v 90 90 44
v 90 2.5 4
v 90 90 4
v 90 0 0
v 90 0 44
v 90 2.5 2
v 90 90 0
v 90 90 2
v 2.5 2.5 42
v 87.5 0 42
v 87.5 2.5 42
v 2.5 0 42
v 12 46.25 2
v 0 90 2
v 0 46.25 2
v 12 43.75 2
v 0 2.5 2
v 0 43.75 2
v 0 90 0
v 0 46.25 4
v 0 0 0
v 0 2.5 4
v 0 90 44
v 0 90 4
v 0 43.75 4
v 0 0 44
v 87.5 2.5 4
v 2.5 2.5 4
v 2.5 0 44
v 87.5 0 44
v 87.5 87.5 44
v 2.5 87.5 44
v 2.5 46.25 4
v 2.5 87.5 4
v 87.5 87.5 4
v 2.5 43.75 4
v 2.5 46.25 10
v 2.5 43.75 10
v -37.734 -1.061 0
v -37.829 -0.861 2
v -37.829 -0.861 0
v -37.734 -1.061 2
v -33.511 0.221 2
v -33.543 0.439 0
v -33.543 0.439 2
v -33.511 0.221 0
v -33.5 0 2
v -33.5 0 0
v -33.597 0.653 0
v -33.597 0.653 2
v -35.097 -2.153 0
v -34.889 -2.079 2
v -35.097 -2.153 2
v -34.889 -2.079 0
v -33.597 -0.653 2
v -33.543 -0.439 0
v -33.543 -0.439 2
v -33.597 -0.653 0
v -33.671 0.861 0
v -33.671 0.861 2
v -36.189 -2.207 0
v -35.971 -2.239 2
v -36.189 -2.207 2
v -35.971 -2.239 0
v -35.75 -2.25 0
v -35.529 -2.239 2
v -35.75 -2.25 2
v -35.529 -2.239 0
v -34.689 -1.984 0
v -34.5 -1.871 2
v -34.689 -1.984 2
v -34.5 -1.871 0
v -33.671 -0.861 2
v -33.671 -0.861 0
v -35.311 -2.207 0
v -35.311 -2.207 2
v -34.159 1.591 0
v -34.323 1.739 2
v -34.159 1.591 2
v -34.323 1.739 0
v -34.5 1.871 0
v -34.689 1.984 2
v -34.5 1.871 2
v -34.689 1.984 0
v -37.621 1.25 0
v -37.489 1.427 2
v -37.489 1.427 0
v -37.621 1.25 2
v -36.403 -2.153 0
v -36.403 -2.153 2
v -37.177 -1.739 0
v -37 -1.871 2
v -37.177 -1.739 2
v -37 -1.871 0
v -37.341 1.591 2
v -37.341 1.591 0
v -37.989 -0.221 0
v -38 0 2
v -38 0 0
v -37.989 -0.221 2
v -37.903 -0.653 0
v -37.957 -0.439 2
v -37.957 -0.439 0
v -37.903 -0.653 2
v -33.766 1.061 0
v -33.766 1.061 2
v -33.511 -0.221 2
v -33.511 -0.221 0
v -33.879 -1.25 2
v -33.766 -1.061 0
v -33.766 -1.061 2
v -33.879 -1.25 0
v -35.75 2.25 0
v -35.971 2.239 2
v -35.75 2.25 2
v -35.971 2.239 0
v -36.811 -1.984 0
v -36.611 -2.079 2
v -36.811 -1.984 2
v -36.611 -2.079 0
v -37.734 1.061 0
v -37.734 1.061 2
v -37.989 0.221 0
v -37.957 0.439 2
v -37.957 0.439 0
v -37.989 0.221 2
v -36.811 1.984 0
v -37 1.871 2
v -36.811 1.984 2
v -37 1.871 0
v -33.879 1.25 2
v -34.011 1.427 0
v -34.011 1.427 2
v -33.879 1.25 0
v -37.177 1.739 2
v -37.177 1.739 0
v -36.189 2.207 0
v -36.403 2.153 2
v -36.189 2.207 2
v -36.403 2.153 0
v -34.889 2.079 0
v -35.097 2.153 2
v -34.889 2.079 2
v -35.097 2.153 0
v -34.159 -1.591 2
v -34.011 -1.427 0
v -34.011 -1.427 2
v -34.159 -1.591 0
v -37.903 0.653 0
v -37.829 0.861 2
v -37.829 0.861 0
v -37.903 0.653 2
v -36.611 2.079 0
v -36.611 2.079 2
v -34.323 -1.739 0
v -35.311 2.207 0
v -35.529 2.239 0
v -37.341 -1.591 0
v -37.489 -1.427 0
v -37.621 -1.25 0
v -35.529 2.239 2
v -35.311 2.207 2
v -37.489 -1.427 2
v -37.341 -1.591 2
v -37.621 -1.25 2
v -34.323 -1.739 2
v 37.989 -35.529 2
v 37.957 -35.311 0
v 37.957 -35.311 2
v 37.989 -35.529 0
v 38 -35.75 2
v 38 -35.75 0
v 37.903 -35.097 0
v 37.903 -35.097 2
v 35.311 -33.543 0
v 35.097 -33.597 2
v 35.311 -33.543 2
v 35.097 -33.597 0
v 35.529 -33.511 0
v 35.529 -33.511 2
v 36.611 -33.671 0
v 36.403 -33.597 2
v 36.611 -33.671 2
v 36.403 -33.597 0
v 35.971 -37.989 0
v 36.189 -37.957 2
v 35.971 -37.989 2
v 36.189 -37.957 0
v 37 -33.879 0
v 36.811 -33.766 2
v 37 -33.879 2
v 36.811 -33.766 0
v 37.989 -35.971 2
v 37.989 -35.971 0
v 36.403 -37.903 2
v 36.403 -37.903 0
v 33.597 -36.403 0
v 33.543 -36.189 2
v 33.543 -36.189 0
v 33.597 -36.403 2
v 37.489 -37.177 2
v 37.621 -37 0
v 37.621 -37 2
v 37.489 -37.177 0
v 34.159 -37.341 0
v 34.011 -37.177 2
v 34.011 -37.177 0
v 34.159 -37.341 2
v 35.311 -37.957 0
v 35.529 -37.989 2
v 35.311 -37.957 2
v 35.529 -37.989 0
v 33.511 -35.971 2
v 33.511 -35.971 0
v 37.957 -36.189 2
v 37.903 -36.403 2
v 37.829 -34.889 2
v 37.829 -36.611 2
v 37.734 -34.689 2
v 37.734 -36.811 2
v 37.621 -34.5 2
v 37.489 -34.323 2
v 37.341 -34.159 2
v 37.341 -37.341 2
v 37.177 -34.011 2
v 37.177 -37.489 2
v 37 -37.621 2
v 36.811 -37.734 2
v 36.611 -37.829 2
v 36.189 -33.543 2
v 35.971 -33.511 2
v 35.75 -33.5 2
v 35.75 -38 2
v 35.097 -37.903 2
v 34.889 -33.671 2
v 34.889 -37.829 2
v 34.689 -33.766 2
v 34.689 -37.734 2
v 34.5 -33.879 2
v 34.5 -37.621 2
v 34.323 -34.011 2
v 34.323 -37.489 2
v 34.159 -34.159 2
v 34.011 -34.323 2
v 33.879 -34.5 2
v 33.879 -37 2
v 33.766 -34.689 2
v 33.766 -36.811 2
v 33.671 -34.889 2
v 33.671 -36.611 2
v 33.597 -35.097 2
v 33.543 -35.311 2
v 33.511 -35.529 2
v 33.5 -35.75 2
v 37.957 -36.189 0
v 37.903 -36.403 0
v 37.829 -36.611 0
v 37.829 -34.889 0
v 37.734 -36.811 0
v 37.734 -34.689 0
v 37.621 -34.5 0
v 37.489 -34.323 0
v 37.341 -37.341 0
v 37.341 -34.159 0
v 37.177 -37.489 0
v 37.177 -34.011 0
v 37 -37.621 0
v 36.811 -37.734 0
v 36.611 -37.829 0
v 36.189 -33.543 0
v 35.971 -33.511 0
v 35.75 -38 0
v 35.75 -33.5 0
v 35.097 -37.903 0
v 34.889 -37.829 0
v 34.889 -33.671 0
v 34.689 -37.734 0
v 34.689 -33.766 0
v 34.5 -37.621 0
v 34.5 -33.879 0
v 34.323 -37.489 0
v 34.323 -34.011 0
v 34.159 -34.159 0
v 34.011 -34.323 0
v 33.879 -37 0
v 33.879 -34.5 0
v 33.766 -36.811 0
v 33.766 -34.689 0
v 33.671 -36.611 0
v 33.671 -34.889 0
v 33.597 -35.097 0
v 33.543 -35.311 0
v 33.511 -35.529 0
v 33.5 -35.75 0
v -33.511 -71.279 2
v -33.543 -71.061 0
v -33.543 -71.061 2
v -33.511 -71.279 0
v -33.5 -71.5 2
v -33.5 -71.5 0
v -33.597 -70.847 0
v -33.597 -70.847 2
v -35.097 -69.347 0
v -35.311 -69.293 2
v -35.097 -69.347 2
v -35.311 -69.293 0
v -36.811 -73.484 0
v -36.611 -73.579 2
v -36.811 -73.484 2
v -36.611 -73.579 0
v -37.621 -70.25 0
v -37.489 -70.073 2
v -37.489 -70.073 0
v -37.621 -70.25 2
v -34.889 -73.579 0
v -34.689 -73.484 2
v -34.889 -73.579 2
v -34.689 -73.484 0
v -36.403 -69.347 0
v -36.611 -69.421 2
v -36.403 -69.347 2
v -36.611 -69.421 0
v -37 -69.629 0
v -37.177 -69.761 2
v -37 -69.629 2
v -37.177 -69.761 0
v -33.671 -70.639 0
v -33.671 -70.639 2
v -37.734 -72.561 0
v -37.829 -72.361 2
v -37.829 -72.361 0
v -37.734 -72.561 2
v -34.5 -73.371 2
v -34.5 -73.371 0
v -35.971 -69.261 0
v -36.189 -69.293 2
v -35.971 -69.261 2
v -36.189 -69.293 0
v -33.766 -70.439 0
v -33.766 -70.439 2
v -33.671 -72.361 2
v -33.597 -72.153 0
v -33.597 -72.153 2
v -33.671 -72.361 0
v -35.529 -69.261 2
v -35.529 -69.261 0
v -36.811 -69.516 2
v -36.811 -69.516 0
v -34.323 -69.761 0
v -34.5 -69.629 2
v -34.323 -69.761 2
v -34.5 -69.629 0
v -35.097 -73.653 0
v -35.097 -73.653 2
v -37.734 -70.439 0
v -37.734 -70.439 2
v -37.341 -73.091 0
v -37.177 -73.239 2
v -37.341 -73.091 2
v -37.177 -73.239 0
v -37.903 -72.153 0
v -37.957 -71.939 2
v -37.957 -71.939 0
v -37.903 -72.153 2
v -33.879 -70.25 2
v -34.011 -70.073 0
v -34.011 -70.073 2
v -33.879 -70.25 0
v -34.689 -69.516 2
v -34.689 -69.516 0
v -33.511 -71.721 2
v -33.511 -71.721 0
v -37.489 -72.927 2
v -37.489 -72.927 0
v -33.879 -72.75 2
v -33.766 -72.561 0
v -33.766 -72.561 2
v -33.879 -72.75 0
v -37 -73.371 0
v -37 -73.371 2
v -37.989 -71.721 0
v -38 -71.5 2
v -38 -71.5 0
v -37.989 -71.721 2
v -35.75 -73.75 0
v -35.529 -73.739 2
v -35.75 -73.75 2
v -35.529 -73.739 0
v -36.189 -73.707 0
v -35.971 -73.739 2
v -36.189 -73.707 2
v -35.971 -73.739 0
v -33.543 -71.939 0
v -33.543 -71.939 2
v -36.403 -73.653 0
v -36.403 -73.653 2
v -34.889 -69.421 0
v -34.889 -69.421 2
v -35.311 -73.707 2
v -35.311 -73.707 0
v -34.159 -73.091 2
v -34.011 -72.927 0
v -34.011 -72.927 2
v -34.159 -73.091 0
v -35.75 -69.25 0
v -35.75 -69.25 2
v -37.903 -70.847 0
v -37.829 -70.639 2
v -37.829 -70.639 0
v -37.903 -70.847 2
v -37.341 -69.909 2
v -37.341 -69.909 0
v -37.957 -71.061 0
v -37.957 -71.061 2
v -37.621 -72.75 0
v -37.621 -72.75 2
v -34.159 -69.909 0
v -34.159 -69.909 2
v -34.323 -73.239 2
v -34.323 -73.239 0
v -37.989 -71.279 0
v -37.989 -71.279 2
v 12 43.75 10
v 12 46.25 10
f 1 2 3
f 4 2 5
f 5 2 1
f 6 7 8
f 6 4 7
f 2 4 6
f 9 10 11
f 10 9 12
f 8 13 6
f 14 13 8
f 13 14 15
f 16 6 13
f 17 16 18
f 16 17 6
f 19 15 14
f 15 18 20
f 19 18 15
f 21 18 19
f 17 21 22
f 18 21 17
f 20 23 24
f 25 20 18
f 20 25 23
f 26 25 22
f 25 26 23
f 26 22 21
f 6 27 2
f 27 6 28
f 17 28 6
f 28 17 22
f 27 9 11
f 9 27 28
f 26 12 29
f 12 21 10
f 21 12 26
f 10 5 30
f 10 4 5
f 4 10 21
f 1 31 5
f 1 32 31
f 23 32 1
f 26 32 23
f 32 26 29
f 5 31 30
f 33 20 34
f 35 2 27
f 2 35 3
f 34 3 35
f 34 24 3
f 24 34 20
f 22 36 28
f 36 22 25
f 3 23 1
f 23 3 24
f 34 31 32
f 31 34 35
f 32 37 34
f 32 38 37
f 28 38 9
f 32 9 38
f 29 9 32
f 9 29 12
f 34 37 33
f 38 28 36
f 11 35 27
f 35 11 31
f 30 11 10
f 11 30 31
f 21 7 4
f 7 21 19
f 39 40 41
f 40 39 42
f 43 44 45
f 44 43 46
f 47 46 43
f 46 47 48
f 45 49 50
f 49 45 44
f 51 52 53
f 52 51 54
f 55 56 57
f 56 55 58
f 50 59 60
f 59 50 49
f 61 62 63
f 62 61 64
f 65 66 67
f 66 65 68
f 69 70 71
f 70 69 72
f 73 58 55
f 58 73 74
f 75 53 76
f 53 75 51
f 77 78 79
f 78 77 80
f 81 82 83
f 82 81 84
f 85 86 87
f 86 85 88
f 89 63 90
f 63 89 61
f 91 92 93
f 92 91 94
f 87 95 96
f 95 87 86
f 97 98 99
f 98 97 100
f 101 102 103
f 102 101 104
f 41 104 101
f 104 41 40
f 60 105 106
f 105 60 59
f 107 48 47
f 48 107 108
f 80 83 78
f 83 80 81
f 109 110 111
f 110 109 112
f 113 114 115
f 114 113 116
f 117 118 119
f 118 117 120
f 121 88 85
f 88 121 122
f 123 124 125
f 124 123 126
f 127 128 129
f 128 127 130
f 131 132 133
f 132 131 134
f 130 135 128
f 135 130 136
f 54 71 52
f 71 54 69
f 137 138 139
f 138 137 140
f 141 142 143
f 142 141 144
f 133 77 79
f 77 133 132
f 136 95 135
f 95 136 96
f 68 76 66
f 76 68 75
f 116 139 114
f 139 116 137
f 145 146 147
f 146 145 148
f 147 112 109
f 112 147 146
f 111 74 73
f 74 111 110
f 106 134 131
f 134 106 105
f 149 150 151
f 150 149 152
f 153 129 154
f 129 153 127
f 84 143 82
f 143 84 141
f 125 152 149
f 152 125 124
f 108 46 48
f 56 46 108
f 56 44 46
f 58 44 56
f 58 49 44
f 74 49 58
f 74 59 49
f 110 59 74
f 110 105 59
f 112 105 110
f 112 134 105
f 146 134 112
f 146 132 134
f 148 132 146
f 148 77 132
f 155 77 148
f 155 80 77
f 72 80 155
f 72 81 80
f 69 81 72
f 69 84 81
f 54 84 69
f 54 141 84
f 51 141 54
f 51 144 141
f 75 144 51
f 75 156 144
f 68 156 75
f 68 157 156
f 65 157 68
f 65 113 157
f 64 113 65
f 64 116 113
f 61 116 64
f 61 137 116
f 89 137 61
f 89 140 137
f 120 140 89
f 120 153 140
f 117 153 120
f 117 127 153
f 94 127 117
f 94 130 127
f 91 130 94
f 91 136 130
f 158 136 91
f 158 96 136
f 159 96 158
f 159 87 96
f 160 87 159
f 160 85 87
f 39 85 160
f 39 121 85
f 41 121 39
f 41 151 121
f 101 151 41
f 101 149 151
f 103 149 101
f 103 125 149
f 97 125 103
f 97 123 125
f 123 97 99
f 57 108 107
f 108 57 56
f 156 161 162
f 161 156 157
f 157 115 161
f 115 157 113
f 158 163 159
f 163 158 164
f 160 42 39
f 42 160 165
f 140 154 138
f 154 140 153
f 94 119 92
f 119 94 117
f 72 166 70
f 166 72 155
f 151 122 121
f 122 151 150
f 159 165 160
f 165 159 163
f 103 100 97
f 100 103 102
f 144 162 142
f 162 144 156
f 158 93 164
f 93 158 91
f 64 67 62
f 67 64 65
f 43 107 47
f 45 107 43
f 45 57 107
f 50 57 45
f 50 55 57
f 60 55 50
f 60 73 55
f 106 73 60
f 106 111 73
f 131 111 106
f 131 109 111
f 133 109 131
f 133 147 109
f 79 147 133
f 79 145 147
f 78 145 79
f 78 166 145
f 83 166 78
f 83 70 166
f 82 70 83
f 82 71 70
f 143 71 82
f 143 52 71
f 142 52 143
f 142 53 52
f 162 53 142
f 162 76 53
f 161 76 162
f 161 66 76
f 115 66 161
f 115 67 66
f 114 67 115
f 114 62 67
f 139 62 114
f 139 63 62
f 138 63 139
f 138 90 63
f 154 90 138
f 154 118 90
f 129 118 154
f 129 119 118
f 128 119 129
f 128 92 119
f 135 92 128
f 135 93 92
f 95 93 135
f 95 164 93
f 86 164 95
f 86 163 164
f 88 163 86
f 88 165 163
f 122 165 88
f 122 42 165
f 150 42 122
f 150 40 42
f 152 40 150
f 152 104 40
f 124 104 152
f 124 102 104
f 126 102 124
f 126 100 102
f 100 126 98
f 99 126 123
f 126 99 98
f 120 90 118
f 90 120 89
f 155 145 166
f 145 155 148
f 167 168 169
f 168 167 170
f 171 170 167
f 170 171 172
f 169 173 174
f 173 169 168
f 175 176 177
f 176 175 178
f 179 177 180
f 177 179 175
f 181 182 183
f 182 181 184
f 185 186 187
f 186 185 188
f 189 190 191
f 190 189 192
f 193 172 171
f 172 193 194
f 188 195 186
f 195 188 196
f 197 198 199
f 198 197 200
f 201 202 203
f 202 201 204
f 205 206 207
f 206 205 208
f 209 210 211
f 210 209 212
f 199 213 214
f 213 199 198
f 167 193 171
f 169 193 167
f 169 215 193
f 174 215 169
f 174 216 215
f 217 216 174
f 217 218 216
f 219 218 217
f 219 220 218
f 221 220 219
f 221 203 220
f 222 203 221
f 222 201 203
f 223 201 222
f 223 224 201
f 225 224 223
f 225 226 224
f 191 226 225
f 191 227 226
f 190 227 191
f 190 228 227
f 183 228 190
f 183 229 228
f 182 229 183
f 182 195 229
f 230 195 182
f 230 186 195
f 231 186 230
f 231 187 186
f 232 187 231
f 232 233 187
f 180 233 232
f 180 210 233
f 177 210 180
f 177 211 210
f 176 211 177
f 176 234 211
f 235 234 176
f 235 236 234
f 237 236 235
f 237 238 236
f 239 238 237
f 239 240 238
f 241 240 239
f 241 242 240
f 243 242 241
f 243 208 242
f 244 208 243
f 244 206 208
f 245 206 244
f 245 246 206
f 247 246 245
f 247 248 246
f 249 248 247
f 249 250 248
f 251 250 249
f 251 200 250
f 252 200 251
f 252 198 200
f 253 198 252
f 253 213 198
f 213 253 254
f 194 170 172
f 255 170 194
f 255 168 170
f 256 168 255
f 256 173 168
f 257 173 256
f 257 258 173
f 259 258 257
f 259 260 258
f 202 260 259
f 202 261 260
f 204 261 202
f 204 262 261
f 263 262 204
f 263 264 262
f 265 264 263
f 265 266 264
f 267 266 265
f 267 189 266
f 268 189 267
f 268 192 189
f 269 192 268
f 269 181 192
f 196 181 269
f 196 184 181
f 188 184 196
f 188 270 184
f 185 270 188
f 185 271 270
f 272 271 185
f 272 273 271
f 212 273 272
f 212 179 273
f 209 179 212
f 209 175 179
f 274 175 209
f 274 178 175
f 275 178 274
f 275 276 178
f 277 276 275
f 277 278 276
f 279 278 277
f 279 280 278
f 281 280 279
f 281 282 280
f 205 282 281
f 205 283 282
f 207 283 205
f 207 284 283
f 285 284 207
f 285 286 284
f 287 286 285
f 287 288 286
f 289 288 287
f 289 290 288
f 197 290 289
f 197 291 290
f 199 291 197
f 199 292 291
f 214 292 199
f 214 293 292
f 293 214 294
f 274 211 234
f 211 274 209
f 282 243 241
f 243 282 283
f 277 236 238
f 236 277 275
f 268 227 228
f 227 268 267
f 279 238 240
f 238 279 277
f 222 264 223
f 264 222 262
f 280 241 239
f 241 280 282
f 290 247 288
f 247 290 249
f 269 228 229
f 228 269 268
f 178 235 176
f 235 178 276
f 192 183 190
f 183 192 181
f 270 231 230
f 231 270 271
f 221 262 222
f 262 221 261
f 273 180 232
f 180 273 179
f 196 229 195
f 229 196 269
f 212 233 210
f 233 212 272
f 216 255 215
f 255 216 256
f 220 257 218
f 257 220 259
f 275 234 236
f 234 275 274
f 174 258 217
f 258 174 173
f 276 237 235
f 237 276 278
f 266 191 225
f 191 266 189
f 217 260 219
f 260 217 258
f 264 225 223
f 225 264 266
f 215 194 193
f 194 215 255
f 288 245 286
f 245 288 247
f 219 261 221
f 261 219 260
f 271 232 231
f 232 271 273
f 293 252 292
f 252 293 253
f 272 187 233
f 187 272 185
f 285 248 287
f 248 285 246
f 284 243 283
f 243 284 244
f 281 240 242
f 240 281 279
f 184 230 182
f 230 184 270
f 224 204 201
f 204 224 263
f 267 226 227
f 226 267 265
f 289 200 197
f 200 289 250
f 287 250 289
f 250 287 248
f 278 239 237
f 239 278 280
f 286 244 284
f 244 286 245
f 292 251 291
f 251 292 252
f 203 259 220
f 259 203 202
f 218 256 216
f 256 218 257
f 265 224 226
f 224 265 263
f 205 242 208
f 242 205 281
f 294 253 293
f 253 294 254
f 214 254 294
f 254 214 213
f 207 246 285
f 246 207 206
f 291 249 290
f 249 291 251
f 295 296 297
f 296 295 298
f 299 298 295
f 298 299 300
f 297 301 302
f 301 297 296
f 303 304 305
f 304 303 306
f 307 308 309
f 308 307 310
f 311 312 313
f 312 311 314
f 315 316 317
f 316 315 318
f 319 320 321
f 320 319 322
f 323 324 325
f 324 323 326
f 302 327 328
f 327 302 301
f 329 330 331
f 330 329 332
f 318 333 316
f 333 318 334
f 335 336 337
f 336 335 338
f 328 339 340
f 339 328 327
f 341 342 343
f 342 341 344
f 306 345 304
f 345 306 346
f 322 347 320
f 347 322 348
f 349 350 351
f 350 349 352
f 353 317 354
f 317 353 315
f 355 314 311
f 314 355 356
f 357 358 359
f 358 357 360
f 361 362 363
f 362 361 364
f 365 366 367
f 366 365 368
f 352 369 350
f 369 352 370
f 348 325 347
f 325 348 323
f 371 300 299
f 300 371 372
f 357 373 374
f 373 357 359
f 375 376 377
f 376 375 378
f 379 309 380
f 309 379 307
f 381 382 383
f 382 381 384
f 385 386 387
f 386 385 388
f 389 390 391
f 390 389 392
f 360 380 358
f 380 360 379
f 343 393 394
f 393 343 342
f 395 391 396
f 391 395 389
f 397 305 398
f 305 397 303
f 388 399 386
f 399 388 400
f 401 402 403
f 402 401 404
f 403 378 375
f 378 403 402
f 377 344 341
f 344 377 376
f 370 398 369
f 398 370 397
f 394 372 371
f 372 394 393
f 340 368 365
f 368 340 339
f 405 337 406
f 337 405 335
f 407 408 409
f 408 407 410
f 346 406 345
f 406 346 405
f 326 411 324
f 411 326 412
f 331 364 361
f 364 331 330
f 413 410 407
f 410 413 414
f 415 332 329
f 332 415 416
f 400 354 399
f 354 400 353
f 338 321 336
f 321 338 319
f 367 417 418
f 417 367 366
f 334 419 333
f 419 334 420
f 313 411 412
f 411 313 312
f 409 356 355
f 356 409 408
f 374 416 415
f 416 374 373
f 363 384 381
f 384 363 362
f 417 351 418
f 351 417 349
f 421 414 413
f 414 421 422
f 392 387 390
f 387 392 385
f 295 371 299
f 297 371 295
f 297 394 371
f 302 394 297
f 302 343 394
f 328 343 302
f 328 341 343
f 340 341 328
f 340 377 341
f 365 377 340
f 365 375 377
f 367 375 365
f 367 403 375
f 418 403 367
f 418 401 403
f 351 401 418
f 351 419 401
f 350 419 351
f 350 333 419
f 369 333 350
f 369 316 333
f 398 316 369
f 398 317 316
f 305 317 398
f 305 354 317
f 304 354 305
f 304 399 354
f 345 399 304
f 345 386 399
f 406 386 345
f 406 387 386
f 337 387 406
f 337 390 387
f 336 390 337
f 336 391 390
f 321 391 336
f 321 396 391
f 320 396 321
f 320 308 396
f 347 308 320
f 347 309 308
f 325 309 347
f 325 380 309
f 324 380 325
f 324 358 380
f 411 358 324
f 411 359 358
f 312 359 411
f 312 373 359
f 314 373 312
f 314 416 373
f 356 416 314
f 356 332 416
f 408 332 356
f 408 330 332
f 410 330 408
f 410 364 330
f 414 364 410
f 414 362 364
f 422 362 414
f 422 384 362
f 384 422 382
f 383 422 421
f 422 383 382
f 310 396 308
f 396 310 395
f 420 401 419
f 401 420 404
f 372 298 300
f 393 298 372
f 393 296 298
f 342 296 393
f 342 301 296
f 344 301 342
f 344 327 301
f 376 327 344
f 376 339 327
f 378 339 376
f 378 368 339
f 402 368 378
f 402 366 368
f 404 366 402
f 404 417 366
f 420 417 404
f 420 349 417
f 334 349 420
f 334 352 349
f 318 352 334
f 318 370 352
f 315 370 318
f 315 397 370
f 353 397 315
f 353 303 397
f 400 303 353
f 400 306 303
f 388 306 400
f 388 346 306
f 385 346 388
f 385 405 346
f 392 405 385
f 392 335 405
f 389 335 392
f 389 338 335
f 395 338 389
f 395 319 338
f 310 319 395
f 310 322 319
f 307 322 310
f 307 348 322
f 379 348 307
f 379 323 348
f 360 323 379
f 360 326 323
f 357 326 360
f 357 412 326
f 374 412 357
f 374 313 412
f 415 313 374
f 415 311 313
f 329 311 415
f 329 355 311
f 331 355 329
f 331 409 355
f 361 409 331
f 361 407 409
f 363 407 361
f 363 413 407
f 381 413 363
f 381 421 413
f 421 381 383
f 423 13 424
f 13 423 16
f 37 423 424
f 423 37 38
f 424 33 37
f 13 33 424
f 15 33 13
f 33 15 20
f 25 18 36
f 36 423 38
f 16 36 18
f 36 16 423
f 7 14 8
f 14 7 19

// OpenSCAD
// Variables for dimensions
outer_size_x = 90;  // Outer size in X direction
outer_size_y = 90;  // Outer size in Y direction
top_plate_thickness = 2;  // Thickness of the top plate
wall_thickness = 2.5;  // Thickness of the walls
wall_height = 40;  // Height of the walls from the top plate
screw_hole_diameter = 4.5;  // Diameter of screw holes
screw_pattern_distance = 71.5;  // Distance between screw holes in square pattern
notch_width = 12;  // Width of the cable notch
notch_depth = 8;  // Depth of the cable notch from the open edge

// Main housing
union() {
  // Top plate (lying on the bed, z=0 to z=2)
  cube([outer_size_x, outer_size_y, top_plate_thickness], center=false);

  // Walls rising from the top plate
  translate([0, 0, top_plate_thickness]) {
    // Front wall
    cube([outer_size_x, wall_thickness, wall_height], center=false);
    // Back wall
    translate([0, outer_size_y - wall_thickness, top_plate_thickness]) {
      cube([outer_size_x, wall_thickness, wall_height], center=false);
    }
    // Left wall
    translate([0, 0, top_plate_thickness]) {
      cube([wall_thickness, outer_size_y, wall_height], center=false);
    }
    // Right wall
    translate([outer_size_x - wall_thickness, 0, top_plate_thickness]) {
      cube([wall_thickness, outer_size_y, wall_height], center=false);
    }
  }

  // Screw holes in the top plate
  for (i = [0:3]) {
    // Calculate positions for square pattern
    x = (screw_pattern_distance / 2) * (1 - 2 * (i % 2));
    y = (screw_pattern_distance / 2) * (1 - 2 * (i / 2 % 2));
    translate([x, y, 0]) {
      cylinder(r = screw_hole_diameter / 2, h = top_plate_thickness, $fn=64);
    }
  }

  // Cable notch in the front wall
  translate([0, (outer_size_y - wall_thickness) / 2, top_plate_thickness]) {
    // Notch depth is 8 mm from the open edge (z=32 to z=40)
    // So we cut from z=32 to z=40, which is 8 mm deep
    // Notch is 12 mm wide and 8 mm deep, centered along the wall
    difference() {
      // Create a rectangular block for the notch
      cube([notch_width, wall_thickness, 8], center=false);
      // Cut a square hole in the middle of the notch block
      translate([notch_width / 2 - 1, 0, 32]) {
        cube([2, 2, 8], center=false);
      }
    }
  }
}
